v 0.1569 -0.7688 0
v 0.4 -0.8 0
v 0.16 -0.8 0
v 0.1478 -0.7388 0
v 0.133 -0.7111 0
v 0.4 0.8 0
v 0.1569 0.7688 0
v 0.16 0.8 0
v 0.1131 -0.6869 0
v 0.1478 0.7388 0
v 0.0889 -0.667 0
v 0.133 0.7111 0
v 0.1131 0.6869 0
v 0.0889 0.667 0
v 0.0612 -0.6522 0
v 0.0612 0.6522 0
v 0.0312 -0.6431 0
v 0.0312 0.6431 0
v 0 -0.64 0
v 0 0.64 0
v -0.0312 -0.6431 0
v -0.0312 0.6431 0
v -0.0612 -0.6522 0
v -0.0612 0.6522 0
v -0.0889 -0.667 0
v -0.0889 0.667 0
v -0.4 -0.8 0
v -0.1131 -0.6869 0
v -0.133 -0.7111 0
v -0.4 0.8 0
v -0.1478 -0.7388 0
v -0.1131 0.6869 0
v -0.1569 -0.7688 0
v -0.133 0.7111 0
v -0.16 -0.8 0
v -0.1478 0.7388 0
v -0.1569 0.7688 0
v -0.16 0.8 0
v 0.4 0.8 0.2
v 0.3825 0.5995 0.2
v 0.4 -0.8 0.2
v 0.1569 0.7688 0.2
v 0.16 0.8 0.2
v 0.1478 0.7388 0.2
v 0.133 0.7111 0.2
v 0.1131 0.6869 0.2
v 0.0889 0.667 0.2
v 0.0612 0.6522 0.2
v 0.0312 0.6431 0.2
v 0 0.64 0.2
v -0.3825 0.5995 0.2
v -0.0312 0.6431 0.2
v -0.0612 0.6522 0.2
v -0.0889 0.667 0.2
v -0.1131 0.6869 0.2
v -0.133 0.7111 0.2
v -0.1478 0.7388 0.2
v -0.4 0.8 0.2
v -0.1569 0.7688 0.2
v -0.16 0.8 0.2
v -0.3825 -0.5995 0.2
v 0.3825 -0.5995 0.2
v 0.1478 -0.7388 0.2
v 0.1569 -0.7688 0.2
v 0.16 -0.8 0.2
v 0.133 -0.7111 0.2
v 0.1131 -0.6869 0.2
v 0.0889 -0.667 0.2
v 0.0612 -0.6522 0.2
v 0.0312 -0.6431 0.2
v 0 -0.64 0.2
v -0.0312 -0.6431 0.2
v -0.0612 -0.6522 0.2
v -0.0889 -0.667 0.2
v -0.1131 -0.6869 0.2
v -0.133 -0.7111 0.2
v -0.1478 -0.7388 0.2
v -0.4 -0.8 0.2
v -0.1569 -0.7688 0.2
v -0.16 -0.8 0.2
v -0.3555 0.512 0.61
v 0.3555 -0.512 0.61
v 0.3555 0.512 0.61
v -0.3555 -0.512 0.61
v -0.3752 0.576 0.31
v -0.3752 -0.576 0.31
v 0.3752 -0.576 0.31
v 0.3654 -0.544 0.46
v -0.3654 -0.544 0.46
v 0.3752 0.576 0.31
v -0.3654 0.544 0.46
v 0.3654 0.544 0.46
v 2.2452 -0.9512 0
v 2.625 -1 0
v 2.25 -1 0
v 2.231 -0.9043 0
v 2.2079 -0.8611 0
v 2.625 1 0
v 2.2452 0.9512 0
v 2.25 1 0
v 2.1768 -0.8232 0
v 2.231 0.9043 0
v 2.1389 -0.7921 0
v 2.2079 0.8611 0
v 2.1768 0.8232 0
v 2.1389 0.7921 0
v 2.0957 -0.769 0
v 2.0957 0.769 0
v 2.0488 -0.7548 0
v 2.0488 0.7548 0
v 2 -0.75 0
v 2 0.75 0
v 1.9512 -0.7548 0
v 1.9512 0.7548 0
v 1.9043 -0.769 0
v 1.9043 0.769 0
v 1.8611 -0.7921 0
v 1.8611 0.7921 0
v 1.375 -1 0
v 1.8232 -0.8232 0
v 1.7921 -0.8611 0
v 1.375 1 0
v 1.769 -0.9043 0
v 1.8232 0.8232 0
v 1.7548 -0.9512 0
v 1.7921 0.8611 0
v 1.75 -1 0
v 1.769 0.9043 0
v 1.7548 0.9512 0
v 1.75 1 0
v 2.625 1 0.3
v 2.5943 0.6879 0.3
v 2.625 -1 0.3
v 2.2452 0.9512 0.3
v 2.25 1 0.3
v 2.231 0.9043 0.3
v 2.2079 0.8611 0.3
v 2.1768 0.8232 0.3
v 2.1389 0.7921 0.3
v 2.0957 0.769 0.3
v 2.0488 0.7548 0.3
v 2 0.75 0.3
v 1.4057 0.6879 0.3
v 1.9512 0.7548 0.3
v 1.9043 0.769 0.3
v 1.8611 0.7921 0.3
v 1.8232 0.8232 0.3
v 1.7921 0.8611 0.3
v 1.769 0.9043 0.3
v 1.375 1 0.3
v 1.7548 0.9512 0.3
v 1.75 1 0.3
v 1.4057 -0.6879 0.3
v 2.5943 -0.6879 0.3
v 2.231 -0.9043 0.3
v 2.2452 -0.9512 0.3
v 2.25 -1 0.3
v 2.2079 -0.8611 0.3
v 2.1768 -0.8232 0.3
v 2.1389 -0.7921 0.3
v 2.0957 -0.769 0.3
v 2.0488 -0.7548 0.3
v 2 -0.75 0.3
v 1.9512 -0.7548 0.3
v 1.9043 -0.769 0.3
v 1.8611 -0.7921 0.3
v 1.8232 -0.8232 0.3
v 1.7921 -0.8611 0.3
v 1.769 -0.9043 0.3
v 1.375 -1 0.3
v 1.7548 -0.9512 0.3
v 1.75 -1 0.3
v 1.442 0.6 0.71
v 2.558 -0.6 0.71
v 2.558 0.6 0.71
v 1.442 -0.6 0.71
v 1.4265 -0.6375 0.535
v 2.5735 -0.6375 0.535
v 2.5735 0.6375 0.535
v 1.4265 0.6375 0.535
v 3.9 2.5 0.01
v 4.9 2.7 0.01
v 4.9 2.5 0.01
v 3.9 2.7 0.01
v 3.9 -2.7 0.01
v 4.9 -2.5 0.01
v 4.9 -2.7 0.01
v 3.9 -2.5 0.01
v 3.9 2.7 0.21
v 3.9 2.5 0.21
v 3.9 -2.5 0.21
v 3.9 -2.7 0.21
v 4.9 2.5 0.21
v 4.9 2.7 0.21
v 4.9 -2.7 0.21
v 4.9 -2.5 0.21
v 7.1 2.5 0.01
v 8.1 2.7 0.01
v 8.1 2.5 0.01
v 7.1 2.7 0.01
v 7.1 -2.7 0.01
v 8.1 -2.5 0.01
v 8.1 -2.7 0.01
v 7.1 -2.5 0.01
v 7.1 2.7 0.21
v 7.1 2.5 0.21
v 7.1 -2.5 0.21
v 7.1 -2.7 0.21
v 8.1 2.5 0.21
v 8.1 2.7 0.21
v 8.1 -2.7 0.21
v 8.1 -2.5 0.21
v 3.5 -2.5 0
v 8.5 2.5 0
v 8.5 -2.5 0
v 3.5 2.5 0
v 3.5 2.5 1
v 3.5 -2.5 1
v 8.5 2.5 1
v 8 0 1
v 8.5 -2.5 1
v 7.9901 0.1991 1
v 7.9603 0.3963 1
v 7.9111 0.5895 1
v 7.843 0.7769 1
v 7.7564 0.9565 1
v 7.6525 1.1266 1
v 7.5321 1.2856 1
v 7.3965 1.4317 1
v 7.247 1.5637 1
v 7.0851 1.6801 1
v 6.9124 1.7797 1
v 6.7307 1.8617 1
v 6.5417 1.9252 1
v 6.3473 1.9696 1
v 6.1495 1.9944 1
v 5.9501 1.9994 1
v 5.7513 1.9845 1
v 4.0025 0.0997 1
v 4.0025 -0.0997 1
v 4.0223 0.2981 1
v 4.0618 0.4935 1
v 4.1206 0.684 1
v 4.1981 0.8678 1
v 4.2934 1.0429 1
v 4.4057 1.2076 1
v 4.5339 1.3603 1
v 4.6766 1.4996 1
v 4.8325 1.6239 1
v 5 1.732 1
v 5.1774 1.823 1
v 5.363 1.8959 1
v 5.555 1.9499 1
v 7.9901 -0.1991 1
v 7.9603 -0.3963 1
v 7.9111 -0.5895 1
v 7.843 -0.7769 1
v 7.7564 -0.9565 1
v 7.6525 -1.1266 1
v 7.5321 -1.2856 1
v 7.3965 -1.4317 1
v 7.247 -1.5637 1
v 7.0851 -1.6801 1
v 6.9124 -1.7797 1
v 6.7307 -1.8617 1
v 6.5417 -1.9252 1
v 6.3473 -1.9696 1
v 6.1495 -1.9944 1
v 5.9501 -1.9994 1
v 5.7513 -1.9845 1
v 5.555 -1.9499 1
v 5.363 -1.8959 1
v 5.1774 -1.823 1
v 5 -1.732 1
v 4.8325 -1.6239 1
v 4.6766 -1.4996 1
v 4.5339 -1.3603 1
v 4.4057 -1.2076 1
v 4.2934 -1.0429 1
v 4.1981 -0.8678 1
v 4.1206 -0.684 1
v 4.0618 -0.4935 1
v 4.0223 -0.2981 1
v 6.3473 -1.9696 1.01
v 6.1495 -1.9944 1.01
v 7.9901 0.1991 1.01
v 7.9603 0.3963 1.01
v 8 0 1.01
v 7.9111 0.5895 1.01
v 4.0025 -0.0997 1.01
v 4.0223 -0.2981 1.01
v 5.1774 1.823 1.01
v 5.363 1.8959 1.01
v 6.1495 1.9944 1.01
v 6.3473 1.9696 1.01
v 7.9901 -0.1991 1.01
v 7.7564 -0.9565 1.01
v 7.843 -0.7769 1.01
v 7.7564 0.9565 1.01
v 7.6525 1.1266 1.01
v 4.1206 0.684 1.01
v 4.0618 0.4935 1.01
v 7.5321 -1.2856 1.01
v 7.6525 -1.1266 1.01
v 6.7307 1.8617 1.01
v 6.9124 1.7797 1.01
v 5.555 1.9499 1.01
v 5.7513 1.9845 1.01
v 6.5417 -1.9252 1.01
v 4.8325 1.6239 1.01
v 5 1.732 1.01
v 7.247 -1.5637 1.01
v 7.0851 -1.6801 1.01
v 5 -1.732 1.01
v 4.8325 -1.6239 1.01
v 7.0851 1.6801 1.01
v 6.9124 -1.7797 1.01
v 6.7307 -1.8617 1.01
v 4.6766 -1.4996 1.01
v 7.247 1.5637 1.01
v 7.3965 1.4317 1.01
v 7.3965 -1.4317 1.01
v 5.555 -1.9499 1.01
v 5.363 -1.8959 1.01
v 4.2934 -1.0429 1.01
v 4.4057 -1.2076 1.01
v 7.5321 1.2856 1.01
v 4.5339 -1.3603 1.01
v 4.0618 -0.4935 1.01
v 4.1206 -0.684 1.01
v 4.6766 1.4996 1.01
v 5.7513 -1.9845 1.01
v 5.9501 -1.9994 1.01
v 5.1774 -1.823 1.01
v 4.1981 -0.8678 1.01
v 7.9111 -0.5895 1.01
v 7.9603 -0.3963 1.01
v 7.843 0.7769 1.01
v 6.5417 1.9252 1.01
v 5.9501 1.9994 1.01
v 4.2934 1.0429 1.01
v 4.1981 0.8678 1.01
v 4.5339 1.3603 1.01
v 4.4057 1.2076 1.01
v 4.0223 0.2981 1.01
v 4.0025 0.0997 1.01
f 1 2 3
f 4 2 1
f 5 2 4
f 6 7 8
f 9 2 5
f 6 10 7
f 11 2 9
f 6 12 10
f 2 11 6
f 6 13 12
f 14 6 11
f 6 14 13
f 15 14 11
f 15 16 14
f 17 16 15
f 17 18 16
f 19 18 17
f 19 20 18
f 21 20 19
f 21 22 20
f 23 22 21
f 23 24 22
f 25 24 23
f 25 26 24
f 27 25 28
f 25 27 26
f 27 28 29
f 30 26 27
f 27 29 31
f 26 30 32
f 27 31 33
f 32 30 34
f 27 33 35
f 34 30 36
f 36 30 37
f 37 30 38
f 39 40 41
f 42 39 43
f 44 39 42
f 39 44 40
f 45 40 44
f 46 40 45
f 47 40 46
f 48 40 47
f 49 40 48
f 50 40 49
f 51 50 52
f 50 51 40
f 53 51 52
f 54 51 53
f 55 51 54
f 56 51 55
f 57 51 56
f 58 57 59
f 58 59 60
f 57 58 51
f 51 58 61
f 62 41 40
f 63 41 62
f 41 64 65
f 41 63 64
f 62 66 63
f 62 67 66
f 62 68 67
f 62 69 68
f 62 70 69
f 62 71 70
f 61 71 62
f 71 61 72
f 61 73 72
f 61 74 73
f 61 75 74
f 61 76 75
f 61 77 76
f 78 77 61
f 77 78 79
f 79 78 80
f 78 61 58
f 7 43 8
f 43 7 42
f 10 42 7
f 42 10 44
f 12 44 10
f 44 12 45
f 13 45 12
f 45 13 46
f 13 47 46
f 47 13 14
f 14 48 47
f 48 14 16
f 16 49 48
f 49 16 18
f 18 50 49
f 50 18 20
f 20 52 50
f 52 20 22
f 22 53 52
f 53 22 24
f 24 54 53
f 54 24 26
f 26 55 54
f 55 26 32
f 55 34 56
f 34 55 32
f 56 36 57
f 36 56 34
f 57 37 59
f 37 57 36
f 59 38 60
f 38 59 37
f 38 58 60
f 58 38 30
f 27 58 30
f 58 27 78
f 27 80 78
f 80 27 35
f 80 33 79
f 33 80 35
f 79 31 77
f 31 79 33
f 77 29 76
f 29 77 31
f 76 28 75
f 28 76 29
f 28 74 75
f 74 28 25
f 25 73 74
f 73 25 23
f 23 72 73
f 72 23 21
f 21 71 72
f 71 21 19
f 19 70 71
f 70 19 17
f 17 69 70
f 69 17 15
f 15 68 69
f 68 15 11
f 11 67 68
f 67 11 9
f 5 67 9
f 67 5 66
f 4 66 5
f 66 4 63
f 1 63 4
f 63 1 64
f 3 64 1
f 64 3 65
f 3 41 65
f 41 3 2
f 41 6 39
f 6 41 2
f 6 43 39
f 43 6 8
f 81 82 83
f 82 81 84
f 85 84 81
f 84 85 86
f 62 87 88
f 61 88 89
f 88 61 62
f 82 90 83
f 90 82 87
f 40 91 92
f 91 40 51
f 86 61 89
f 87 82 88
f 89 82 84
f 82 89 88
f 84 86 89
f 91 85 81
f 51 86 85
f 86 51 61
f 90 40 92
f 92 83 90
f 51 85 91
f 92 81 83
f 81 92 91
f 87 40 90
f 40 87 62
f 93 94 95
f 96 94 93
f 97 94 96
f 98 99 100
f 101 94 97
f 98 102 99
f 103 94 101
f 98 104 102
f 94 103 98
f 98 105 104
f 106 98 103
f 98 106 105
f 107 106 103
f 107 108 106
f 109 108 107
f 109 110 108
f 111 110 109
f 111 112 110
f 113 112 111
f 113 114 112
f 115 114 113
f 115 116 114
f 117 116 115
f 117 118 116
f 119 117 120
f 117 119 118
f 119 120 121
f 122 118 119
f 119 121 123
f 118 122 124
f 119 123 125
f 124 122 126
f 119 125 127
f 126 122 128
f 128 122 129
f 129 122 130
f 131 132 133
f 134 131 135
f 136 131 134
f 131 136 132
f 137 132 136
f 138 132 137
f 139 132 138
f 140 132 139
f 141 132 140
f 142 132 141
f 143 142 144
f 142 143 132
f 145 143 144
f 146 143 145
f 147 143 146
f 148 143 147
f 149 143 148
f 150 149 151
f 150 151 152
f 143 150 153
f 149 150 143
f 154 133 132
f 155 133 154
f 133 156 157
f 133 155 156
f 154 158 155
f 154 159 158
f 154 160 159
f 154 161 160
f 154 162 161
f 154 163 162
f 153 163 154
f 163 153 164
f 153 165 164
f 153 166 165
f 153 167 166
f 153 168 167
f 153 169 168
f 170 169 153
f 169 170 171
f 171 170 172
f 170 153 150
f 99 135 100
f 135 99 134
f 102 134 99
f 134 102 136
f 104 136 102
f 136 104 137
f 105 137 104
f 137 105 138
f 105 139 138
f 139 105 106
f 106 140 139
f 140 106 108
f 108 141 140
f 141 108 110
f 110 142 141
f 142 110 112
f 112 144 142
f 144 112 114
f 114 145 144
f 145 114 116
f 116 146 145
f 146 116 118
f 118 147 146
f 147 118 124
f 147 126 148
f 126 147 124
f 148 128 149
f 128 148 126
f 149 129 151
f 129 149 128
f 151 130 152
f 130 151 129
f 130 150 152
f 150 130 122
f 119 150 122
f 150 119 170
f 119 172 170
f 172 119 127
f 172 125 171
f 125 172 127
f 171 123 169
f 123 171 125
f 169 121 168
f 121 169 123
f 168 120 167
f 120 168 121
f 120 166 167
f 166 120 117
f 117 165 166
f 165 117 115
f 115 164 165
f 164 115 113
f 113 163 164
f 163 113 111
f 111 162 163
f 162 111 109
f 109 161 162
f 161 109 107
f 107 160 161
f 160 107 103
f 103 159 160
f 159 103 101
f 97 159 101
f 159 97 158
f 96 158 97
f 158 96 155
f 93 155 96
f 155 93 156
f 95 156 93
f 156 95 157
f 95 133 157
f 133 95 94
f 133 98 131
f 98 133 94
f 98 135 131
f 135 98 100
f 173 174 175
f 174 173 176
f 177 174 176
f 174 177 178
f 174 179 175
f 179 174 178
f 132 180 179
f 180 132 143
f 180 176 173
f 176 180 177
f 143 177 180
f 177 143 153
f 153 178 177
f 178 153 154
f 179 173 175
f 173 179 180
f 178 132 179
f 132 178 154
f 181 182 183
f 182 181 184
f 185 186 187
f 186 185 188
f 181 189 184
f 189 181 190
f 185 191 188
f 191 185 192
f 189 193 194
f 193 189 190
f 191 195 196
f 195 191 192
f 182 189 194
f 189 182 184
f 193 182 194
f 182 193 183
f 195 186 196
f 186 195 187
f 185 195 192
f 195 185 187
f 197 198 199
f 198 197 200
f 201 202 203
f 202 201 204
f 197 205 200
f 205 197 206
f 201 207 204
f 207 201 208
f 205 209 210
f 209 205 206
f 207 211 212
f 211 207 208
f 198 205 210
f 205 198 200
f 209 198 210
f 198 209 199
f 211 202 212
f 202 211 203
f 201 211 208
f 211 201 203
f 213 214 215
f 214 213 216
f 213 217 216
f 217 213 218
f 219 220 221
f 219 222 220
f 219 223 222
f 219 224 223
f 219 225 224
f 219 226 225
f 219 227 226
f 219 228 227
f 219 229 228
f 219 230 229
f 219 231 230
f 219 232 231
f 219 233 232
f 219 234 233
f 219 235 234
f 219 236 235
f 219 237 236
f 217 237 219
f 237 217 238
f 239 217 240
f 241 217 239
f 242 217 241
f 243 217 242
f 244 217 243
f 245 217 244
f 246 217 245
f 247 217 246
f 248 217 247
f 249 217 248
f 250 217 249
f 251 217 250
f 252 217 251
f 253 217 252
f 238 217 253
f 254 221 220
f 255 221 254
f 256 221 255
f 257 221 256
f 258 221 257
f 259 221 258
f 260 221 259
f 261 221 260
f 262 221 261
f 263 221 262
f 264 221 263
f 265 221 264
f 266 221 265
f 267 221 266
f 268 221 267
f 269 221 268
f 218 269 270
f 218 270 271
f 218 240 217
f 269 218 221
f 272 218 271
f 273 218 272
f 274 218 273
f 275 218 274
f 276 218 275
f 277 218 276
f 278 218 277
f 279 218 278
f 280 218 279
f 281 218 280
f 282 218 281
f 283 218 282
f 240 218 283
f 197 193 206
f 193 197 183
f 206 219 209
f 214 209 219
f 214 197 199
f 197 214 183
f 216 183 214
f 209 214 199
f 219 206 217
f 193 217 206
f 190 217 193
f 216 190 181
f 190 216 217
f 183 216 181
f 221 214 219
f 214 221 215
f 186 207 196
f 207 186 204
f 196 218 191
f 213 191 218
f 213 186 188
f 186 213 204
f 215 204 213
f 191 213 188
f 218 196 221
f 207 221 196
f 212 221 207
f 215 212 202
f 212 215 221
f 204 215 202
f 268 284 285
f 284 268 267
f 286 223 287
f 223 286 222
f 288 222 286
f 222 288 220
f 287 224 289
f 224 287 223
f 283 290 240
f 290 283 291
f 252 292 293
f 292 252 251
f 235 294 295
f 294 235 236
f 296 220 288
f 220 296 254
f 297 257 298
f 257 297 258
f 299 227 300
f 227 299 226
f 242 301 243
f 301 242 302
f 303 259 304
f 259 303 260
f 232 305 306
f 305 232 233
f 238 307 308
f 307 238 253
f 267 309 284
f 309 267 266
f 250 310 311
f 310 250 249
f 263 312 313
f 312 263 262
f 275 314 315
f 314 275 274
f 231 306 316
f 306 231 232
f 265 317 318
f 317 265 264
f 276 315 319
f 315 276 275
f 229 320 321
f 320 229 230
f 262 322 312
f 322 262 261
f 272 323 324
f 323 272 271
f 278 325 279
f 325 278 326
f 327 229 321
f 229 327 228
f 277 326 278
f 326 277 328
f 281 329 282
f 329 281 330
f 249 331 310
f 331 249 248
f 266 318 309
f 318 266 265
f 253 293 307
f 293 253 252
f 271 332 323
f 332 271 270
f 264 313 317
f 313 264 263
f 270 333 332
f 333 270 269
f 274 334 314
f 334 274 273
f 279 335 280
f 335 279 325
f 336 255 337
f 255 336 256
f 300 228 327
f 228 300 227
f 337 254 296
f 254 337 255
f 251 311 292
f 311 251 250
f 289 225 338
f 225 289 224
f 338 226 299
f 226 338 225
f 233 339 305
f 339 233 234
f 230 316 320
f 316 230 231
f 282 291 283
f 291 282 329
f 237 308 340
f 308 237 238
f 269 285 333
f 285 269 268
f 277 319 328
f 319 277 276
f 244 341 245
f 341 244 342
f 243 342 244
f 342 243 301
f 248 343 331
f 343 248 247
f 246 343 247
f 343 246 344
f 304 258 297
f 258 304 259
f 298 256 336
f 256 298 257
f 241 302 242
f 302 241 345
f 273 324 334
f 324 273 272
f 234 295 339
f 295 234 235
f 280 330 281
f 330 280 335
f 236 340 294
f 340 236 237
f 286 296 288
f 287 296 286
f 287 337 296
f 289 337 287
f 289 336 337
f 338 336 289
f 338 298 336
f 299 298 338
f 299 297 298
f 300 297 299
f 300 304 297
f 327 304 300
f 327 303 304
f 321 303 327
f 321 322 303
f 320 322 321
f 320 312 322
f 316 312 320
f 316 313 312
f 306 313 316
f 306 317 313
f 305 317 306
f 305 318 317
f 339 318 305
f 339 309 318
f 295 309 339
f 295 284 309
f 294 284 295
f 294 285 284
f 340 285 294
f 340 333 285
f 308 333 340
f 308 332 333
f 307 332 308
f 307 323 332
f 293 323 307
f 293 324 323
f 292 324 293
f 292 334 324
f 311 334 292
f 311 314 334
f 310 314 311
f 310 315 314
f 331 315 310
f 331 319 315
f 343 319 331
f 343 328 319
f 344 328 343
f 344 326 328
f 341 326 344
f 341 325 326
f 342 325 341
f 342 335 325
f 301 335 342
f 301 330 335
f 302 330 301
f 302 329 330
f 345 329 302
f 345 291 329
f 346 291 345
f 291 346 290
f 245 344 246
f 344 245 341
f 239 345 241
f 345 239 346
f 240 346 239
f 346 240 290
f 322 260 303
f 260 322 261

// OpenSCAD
$fa = 2; $fs = 0.2;

eps = 0.01;

module led(l, w, h1, h2, col = "green") {
    r = w / 5;
    color("silver")
        linear_extrude(h1, convexity = 3)
            difference() {
                square([l, w], center = true);
                for (x = [-1, 1]) translate([x * l / 2, 0]) circle(r, $fn = 32);
            }
    color(col)
        translate([-0.2, 0, 0.05])
            linear_extrude(h1, convexity = 3)
                square([0.3, 0.3], center = true);
    color("white", 0.3)
        translate([0, 0, eps])
            linear_extrude(h2, scale = [0.8, 0.9], convexity = 3)
                square([l - 2 * r, w - eps], center = true);
}

module led_5050() {
    color("white")
        linear_extrude(1)
            square(5, center = true);
    color("gray")
        translate([0, 0, eps])
            cylinder(h = 1, d = 4);
    color("silver")
        for (a = [-1,1])
            translate([a * 1.6, 0, eps])
                linear_extrude(0.2)
                    square([1, 5.4], center = true);
}

module led_603(col = "green") {
    led(1.6, 0.8, 0.2, 0.6);
}

module led_805(col = "green") {
    led(2, 1.25, 0.3, 0.7);
}

module ws2812() {
    led_5050();
}

rotate(90) led_603();

translate([2, 0, 0]) rotate(90) led_805();

translate([6, 0, 0]) ws2812();
